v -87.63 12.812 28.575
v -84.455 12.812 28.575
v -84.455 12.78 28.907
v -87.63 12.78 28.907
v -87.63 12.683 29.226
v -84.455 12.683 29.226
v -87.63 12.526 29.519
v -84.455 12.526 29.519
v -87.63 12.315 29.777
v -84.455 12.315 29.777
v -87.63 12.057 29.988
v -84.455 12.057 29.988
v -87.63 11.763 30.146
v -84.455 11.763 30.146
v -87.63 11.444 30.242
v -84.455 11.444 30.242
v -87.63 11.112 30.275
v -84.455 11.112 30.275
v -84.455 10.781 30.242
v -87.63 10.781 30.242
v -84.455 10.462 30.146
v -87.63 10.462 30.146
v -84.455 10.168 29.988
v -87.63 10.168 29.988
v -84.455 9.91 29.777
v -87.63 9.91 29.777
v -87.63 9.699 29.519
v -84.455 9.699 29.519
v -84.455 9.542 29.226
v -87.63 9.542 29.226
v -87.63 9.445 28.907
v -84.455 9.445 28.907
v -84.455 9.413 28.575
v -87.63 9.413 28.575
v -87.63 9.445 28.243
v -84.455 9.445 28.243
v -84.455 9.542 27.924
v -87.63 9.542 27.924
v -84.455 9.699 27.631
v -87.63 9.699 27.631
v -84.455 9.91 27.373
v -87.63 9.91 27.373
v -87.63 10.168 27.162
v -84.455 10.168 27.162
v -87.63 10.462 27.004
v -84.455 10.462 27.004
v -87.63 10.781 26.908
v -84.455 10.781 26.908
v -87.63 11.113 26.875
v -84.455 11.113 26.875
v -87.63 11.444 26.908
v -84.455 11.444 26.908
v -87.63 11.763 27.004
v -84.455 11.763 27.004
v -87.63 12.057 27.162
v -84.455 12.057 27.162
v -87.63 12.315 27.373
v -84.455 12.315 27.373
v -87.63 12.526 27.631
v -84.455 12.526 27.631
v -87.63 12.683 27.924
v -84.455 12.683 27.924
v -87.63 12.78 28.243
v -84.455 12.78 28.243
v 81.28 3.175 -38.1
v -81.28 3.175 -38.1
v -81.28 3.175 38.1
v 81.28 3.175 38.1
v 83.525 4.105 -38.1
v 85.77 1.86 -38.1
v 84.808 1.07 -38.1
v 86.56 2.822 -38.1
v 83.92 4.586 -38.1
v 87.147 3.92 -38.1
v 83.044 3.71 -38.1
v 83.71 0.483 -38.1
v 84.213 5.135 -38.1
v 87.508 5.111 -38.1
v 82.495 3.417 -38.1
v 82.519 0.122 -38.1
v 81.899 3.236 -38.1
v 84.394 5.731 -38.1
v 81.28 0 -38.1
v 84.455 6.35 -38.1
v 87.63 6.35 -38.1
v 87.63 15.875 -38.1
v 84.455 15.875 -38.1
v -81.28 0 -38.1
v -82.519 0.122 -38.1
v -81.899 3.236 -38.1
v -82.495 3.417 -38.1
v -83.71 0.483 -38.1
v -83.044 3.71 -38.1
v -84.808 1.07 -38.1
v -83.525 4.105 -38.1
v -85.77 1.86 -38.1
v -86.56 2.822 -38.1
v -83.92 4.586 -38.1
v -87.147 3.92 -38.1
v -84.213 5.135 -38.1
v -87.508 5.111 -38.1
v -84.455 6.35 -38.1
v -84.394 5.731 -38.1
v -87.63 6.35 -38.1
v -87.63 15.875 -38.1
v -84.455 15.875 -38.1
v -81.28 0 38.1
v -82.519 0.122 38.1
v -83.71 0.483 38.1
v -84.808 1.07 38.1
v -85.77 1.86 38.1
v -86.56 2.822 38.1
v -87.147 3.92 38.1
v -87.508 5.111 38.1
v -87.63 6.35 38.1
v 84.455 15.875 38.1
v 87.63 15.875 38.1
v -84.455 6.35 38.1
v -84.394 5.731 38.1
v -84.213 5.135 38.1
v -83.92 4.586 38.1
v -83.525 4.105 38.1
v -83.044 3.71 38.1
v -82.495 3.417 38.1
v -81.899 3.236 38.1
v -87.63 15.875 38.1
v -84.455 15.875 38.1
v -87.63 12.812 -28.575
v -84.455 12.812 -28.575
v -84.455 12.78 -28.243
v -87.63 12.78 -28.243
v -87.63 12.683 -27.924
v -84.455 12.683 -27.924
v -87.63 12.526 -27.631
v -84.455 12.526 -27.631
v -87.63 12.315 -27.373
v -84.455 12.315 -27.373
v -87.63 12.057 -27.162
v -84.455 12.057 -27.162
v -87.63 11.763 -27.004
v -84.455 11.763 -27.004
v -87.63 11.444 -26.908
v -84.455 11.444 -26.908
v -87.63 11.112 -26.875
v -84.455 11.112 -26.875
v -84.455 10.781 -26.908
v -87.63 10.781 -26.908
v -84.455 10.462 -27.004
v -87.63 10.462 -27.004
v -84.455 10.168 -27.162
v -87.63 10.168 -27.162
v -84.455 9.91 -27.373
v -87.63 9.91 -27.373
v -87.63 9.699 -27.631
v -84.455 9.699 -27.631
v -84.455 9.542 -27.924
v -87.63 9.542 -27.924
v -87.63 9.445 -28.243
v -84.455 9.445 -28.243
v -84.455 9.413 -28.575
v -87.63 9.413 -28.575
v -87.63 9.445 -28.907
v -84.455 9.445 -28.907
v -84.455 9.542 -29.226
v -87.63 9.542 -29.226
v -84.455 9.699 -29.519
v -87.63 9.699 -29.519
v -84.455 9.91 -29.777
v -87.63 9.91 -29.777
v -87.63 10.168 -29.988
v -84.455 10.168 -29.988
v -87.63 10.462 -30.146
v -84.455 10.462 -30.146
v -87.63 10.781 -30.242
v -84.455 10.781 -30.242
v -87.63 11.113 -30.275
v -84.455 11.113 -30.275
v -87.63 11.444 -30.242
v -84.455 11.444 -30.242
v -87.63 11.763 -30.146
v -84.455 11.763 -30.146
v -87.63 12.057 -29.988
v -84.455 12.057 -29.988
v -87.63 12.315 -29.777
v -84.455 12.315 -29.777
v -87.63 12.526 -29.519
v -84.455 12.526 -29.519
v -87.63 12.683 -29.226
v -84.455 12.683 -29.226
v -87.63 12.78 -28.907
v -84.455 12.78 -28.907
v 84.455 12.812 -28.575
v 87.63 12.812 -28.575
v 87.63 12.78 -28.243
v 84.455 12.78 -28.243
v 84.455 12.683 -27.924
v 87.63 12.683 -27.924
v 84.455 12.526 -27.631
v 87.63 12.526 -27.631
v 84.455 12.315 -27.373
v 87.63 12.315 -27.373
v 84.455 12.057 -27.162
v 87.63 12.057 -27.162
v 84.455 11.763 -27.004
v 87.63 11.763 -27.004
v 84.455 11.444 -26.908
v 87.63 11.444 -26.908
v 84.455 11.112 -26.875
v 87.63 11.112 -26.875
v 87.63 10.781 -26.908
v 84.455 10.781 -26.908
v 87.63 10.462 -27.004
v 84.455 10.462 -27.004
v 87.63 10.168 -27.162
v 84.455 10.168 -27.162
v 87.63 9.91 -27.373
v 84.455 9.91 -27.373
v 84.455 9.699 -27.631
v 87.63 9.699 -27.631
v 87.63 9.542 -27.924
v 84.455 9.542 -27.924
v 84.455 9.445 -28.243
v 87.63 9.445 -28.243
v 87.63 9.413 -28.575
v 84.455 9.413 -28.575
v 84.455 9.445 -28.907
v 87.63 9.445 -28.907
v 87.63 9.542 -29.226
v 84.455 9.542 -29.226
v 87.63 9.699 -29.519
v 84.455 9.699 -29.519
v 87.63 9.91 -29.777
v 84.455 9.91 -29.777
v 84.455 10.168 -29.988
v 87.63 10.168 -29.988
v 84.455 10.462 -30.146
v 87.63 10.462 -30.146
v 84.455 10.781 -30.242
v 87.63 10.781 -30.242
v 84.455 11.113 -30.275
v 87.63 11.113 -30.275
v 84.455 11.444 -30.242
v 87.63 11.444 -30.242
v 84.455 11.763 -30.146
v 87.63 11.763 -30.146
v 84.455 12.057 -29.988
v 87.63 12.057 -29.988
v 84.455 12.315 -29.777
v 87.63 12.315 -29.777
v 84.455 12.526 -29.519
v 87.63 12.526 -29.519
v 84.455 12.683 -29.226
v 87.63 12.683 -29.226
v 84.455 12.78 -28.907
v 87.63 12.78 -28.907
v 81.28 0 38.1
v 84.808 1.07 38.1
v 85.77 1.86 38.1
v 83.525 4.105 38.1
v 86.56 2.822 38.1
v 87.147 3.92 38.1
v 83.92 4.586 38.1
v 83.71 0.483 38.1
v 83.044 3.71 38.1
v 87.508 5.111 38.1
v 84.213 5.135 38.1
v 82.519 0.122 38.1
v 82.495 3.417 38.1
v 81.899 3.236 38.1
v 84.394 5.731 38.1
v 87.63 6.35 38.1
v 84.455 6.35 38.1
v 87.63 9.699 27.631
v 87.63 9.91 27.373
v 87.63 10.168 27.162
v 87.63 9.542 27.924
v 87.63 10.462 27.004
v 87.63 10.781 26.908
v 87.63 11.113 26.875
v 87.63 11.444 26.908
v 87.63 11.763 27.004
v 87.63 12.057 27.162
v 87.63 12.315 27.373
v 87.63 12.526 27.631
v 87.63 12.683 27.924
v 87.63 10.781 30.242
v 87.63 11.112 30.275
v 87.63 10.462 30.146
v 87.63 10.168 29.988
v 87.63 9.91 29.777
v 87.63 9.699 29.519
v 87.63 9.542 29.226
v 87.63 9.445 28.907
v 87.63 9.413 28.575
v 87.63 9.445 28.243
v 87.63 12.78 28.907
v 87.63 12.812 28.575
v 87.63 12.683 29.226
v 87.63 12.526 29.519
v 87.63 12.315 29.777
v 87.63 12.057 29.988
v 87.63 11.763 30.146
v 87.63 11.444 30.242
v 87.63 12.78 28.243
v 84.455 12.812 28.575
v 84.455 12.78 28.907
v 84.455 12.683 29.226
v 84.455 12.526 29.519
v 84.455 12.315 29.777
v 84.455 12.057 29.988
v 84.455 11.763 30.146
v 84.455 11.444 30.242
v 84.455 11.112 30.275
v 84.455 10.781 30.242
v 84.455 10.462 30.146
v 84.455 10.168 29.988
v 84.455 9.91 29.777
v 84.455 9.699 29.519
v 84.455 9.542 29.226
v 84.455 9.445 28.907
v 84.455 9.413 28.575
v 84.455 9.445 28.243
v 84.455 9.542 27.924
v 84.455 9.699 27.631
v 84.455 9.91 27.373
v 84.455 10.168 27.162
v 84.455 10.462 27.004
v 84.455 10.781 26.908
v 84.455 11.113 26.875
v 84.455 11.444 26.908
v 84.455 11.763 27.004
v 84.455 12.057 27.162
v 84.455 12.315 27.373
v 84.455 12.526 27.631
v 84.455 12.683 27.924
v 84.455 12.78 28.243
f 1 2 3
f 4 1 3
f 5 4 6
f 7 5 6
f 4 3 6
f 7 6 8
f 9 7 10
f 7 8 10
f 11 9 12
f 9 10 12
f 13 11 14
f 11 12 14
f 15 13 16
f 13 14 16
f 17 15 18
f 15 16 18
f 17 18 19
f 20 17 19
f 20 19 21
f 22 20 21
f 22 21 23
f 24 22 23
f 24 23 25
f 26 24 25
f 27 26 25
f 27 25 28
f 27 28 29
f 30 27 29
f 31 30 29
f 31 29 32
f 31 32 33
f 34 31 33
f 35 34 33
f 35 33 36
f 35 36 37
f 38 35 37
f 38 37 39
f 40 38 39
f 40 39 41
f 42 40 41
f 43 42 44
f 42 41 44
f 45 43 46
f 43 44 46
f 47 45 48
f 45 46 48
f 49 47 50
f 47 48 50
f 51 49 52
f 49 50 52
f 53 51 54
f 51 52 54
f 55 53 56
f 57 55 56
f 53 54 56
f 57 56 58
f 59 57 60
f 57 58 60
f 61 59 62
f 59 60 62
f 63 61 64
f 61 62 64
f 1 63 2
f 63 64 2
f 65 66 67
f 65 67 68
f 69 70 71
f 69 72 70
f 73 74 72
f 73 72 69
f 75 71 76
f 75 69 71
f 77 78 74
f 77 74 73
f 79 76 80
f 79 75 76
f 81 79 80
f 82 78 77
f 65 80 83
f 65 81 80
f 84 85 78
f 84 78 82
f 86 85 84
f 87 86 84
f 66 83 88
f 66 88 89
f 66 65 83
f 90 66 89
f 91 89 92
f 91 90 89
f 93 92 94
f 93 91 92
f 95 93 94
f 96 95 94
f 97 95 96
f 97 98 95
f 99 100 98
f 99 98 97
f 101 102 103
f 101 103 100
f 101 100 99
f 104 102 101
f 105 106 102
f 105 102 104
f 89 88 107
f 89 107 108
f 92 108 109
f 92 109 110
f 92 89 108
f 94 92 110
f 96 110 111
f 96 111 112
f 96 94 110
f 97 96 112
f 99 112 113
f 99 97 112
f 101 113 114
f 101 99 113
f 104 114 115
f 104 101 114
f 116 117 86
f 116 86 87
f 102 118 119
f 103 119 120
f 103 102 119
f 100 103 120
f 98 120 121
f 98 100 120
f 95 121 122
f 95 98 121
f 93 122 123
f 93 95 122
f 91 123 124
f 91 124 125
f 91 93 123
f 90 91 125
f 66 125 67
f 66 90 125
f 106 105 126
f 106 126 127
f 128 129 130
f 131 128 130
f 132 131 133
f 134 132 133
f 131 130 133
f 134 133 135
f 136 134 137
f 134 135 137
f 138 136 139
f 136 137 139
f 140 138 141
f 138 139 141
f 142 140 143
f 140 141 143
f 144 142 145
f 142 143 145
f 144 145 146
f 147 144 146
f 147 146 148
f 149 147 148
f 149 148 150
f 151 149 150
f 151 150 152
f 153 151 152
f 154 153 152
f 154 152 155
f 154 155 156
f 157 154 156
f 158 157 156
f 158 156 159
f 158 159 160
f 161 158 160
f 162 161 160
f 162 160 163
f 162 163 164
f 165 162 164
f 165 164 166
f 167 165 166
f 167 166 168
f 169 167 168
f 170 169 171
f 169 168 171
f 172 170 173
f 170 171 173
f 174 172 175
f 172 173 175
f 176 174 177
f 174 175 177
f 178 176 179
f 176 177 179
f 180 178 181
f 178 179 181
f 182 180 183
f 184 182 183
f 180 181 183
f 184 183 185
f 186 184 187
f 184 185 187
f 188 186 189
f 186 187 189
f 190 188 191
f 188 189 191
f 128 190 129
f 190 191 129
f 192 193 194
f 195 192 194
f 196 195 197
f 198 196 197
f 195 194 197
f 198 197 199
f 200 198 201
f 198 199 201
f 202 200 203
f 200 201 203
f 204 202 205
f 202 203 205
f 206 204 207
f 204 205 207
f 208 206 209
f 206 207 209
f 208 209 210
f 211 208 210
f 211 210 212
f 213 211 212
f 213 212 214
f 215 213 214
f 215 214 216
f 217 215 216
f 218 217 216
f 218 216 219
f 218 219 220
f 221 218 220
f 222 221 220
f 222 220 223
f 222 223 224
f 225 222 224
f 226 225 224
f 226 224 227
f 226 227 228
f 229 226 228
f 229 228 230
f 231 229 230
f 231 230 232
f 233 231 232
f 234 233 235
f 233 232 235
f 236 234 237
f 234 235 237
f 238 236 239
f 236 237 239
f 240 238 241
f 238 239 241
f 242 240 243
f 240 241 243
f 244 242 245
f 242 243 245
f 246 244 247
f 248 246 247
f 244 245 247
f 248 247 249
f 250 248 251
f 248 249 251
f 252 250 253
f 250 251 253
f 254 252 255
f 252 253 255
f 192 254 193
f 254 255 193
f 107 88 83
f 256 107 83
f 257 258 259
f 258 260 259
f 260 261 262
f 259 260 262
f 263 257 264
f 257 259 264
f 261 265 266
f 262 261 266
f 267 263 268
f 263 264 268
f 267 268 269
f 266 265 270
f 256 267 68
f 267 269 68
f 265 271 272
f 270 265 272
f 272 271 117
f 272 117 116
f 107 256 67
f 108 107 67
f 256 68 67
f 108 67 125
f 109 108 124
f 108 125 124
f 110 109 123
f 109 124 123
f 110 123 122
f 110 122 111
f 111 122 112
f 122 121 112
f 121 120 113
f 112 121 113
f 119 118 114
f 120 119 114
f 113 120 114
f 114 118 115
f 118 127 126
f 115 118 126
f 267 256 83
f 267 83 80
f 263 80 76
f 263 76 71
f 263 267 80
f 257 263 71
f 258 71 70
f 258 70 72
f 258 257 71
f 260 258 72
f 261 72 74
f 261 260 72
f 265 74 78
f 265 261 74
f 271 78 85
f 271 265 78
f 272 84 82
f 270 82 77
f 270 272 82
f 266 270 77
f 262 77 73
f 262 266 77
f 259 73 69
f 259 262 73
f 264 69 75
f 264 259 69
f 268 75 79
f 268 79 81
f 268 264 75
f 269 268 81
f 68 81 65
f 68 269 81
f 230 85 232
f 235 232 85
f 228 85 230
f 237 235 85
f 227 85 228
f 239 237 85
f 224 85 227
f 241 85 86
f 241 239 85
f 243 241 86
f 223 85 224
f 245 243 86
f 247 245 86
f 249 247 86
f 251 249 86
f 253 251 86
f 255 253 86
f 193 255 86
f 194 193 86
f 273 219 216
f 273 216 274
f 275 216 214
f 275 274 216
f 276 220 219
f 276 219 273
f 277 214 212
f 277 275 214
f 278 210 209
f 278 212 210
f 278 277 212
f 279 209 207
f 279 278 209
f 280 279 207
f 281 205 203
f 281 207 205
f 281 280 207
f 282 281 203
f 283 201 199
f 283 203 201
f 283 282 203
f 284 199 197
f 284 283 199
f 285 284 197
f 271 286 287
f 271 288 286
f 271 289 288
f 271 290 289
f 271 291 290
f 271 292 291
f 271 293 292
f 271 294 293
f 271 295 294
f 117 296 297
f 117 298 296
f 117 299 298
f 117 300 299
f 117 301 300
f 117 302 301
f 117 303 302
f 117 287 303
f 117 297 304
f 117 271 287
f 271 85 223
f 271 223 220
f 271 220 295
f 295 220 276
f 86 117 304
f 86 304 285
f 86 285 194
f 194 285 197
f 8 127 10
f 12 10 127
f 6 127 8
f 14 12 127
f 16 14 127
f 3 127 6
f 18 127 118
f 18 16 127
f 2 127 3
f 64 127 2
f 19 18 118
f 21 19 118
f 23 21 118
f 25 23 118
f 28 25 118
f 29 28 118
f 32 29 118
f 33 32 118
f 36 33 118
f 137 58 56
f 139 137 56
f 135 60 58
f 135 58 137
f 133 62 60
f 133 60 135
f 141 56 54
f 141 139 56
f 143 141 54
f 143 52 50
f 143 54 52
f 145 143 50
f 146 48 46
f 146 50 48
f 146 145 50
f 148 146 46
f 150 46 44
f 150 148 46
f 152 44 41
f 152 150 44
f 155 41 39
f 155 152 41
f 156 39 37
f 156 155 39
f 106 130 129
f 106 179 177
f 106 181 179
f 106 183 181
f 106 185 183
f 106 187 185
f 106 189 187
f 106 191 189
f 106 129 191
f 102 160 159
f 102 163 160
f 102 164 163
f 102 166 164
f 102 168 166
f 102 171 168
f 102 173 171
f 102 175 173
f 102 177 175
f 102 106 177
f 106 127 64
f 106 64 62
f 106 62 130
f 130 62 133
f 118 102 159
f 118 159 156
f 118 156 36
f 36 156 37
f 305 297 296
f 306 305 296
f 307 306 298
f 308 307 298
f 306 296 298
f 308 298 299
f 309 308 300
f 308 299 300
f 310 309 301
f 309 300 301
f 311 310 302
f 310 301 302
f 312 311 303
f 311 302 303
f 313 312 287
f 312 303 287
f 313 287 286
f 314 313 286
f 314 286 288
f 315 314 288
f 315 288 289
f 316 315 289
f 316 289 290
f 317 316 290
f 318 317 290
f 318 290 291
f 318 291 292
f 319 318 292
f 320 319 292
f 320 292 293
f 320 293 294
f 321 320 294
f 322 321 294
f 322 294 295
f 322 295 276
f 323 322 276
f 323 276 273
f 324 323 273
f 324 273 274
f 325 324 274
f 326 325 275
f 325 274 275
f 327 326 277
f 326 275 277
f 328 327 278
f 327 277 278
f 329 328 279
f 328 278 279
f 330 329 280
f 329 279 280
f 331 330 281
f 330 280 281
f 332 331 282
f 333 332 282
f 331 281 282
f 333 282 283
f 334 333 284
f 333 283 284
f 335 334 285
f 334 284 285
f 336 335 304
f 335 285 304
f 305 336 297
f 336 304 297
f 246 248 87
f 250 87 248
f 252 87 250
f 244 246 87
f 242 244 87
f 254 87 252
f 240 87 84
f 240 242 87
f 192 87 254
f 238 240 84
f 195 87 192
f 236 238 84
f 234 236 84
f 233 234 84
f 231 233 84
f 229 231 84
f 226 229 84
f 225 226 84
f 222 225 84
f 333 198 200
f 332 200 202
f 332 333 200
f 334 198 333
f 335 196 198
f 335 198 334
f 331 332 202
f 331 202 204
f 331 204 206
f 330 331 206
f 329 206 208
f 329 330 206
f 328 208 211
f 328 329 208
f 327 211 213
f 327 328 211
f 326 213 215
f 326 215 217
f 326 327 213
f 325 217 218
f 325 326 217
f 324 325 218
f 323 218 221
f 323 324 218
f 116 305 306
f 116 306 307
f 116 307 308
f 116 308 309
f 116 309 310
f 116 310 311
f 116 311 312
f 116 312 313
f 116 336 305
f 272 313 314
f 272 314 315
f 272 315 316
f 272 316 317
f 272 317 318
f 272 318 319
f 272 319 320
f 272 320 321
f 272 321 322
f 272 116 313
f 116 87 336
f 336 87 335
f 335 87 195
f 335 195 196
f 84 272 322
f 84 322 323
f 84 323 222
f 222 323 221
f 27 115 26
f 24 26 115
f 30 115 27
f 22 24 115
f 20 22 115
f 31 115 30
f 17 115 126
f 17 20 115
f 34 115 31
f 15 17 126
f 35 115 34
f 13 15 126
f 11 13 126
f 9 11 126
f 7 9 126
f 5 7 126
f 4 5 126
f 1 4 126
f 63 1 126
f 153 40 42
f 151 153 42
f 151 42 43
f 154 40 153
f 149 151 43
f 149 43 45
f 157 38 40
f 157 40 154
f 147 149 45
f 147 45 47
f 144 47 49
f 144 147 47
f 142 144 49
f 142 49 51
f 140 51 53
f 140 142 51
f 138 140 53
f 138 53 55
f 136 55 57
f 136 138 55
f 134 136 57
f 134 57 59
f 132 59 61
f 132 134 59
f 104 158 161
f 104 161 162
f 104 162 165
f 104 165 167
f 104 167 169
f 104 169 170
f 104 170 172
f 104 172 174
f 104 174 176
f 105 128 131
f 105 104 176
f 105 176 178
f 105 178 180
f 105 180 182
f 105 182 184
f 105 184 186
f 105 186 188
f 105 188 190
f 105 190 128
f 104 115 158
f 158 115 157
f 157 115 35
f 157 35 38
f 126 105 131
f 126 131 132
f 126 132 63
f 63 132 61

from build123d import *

# Parameters (mm, degrees)
SKETCH1_W                      = 175.26
SKETCH1_H                      = 76.2
BOSS_EXTRUDE1_DEPTH            = 3.175
EDGE_FLANGE1_STRIP_W           = 19.05
EDGE_FLANGE1_STRIP_H           = 3.175
EDGE_FLANGE1_STRIP_CUT_DEPTH   = 76.2
EDGE_FLANGE1_STRIP_2_W         = 19.05
EDGE_FLANGE1_STRIP_2_H         = 3.175
EDGE_FLANGE1_STRIP_CUT_2_DEPTH = 76.2
EDGE_FLANGE1_DEPTH             = 76.2
EDGE_FLANGE1_BEND_DEPTH        = 76.2
M3_CLEARANCE_HOLE1_D           = 3.4


# Sheet-metal steps are written as plain solids
with BuildPart() as part:
    # Sketch1 → Boss-Extrude1 (new body)
    with BuildSketch(Plane(origin=(0, 0, 0), x_dir=(1, 0, 0), z_dir=(0, 1, 0))):
        Rectangle(SKETCH1_W, SKETCH1_H)
    extrude(amount=BOSS_EXTRUDE1_DEPTH)

    # Edge-Flange1 strip (across the edge) → Edge-Flange1 strip cut (cut)
    with BuildSketch(Plane(origin=(87.63, 3.175, 38.1), x_dir=(-1, 0, 0), z_dir=(0, 0, -1))):
        with Locations((-3.175, -1.5875)):
            Rectangle(EDGE_FLANGE1_STRIP_W, EDGE_FLANGE1_STRIP_H)
    extrude(amount=EDGE_FLANGE1_STRIP_CUT_DEPTH, mode=Mode.SUBTRACT)

    # Edge-Flange1 strip 2 (across the edge) → Edge-Flange1 strip cut 2 (cut)
    with BuildSketch(Plane(origin=(-87.63, 3.175, -38.1), x_dir=(1, 0, 0), z_dir=(0, 0, 1))):
        with Locations((-3.175, -1.5875)):
            Rectangle(EDGE_FLANGE1_STRIP_2_W, EDGE_FLANGE1_STRIP_2_H)
    extrude(amount=EDGE_FLANGE1_STRIP_CUT_2_DEPTH, mode=Mode.SUBTRACT)

    # Edge-Flange1 section (across the edge) → Edge-Flange1 (add)
    with BuildSketch(Plane(origin=(87.63, 3.175, 38.1), x_dir=(-1, 0, 0), z_dir=(0, 0, -1))):
        with BuildLine():
            Line((0, 3.175), (0, 12.7))
            Line((0, 12.7), (3.175, 12.7))
            Line((3.175, 12.7), (3.175, 3.175))
            ThreePointArc((3.175, 3.175), (4.10493597, 0.92993597), (6.35, 0))
            Line((6.35, 0), (6.35, -3.175))
            ThreePointArc((6.35, -3.175), (1.859871939, -1.315128061), (0, 3.175))
        make_face()
    extrude(amount=EDGE_FLANGE1_DEPTH)

    # Edge-Flange1 section 2 (across the edge) → Edge-Flange1 bend (add)
    with BuildSketch(Plane(origin=(-87.63, 3.175, -38.1), x_dir=(1, 0, 0), z_dir=(0, 0, 1))):
        with BuildLine():
            Line((0, 3.175), (0, 12.7))
            Line((0, 12.7), (3.175, 12.7))
            Line((3.175, 12.7), (3.175, 3.175))
            ThreePointArc((3.175, 3.175), (4.10493597, 0.92993597), (6.35, 0))
            Line((6.35, 0), (6.35, -3.175))
            ThreePointArc((6.35, -3.175), (1.859871939, -1.315128061), (0, 3.175))
        make_face()
    extrude(amount=EDGE_FLANGE1_BEND_DEPTH)

    # M3 Clearance Hole1 (through all)
    with Locations(Plane(origin=(-87.63, 11.1125, -28.575), x_dir=(0, -1, 0), z_dir=(-1, 0, 0))):
        with Locations((0, 0), (0, 57.15)):
            Hole(M3_CLEARANCE_HOLE1_D / 2)


solid = part.part
